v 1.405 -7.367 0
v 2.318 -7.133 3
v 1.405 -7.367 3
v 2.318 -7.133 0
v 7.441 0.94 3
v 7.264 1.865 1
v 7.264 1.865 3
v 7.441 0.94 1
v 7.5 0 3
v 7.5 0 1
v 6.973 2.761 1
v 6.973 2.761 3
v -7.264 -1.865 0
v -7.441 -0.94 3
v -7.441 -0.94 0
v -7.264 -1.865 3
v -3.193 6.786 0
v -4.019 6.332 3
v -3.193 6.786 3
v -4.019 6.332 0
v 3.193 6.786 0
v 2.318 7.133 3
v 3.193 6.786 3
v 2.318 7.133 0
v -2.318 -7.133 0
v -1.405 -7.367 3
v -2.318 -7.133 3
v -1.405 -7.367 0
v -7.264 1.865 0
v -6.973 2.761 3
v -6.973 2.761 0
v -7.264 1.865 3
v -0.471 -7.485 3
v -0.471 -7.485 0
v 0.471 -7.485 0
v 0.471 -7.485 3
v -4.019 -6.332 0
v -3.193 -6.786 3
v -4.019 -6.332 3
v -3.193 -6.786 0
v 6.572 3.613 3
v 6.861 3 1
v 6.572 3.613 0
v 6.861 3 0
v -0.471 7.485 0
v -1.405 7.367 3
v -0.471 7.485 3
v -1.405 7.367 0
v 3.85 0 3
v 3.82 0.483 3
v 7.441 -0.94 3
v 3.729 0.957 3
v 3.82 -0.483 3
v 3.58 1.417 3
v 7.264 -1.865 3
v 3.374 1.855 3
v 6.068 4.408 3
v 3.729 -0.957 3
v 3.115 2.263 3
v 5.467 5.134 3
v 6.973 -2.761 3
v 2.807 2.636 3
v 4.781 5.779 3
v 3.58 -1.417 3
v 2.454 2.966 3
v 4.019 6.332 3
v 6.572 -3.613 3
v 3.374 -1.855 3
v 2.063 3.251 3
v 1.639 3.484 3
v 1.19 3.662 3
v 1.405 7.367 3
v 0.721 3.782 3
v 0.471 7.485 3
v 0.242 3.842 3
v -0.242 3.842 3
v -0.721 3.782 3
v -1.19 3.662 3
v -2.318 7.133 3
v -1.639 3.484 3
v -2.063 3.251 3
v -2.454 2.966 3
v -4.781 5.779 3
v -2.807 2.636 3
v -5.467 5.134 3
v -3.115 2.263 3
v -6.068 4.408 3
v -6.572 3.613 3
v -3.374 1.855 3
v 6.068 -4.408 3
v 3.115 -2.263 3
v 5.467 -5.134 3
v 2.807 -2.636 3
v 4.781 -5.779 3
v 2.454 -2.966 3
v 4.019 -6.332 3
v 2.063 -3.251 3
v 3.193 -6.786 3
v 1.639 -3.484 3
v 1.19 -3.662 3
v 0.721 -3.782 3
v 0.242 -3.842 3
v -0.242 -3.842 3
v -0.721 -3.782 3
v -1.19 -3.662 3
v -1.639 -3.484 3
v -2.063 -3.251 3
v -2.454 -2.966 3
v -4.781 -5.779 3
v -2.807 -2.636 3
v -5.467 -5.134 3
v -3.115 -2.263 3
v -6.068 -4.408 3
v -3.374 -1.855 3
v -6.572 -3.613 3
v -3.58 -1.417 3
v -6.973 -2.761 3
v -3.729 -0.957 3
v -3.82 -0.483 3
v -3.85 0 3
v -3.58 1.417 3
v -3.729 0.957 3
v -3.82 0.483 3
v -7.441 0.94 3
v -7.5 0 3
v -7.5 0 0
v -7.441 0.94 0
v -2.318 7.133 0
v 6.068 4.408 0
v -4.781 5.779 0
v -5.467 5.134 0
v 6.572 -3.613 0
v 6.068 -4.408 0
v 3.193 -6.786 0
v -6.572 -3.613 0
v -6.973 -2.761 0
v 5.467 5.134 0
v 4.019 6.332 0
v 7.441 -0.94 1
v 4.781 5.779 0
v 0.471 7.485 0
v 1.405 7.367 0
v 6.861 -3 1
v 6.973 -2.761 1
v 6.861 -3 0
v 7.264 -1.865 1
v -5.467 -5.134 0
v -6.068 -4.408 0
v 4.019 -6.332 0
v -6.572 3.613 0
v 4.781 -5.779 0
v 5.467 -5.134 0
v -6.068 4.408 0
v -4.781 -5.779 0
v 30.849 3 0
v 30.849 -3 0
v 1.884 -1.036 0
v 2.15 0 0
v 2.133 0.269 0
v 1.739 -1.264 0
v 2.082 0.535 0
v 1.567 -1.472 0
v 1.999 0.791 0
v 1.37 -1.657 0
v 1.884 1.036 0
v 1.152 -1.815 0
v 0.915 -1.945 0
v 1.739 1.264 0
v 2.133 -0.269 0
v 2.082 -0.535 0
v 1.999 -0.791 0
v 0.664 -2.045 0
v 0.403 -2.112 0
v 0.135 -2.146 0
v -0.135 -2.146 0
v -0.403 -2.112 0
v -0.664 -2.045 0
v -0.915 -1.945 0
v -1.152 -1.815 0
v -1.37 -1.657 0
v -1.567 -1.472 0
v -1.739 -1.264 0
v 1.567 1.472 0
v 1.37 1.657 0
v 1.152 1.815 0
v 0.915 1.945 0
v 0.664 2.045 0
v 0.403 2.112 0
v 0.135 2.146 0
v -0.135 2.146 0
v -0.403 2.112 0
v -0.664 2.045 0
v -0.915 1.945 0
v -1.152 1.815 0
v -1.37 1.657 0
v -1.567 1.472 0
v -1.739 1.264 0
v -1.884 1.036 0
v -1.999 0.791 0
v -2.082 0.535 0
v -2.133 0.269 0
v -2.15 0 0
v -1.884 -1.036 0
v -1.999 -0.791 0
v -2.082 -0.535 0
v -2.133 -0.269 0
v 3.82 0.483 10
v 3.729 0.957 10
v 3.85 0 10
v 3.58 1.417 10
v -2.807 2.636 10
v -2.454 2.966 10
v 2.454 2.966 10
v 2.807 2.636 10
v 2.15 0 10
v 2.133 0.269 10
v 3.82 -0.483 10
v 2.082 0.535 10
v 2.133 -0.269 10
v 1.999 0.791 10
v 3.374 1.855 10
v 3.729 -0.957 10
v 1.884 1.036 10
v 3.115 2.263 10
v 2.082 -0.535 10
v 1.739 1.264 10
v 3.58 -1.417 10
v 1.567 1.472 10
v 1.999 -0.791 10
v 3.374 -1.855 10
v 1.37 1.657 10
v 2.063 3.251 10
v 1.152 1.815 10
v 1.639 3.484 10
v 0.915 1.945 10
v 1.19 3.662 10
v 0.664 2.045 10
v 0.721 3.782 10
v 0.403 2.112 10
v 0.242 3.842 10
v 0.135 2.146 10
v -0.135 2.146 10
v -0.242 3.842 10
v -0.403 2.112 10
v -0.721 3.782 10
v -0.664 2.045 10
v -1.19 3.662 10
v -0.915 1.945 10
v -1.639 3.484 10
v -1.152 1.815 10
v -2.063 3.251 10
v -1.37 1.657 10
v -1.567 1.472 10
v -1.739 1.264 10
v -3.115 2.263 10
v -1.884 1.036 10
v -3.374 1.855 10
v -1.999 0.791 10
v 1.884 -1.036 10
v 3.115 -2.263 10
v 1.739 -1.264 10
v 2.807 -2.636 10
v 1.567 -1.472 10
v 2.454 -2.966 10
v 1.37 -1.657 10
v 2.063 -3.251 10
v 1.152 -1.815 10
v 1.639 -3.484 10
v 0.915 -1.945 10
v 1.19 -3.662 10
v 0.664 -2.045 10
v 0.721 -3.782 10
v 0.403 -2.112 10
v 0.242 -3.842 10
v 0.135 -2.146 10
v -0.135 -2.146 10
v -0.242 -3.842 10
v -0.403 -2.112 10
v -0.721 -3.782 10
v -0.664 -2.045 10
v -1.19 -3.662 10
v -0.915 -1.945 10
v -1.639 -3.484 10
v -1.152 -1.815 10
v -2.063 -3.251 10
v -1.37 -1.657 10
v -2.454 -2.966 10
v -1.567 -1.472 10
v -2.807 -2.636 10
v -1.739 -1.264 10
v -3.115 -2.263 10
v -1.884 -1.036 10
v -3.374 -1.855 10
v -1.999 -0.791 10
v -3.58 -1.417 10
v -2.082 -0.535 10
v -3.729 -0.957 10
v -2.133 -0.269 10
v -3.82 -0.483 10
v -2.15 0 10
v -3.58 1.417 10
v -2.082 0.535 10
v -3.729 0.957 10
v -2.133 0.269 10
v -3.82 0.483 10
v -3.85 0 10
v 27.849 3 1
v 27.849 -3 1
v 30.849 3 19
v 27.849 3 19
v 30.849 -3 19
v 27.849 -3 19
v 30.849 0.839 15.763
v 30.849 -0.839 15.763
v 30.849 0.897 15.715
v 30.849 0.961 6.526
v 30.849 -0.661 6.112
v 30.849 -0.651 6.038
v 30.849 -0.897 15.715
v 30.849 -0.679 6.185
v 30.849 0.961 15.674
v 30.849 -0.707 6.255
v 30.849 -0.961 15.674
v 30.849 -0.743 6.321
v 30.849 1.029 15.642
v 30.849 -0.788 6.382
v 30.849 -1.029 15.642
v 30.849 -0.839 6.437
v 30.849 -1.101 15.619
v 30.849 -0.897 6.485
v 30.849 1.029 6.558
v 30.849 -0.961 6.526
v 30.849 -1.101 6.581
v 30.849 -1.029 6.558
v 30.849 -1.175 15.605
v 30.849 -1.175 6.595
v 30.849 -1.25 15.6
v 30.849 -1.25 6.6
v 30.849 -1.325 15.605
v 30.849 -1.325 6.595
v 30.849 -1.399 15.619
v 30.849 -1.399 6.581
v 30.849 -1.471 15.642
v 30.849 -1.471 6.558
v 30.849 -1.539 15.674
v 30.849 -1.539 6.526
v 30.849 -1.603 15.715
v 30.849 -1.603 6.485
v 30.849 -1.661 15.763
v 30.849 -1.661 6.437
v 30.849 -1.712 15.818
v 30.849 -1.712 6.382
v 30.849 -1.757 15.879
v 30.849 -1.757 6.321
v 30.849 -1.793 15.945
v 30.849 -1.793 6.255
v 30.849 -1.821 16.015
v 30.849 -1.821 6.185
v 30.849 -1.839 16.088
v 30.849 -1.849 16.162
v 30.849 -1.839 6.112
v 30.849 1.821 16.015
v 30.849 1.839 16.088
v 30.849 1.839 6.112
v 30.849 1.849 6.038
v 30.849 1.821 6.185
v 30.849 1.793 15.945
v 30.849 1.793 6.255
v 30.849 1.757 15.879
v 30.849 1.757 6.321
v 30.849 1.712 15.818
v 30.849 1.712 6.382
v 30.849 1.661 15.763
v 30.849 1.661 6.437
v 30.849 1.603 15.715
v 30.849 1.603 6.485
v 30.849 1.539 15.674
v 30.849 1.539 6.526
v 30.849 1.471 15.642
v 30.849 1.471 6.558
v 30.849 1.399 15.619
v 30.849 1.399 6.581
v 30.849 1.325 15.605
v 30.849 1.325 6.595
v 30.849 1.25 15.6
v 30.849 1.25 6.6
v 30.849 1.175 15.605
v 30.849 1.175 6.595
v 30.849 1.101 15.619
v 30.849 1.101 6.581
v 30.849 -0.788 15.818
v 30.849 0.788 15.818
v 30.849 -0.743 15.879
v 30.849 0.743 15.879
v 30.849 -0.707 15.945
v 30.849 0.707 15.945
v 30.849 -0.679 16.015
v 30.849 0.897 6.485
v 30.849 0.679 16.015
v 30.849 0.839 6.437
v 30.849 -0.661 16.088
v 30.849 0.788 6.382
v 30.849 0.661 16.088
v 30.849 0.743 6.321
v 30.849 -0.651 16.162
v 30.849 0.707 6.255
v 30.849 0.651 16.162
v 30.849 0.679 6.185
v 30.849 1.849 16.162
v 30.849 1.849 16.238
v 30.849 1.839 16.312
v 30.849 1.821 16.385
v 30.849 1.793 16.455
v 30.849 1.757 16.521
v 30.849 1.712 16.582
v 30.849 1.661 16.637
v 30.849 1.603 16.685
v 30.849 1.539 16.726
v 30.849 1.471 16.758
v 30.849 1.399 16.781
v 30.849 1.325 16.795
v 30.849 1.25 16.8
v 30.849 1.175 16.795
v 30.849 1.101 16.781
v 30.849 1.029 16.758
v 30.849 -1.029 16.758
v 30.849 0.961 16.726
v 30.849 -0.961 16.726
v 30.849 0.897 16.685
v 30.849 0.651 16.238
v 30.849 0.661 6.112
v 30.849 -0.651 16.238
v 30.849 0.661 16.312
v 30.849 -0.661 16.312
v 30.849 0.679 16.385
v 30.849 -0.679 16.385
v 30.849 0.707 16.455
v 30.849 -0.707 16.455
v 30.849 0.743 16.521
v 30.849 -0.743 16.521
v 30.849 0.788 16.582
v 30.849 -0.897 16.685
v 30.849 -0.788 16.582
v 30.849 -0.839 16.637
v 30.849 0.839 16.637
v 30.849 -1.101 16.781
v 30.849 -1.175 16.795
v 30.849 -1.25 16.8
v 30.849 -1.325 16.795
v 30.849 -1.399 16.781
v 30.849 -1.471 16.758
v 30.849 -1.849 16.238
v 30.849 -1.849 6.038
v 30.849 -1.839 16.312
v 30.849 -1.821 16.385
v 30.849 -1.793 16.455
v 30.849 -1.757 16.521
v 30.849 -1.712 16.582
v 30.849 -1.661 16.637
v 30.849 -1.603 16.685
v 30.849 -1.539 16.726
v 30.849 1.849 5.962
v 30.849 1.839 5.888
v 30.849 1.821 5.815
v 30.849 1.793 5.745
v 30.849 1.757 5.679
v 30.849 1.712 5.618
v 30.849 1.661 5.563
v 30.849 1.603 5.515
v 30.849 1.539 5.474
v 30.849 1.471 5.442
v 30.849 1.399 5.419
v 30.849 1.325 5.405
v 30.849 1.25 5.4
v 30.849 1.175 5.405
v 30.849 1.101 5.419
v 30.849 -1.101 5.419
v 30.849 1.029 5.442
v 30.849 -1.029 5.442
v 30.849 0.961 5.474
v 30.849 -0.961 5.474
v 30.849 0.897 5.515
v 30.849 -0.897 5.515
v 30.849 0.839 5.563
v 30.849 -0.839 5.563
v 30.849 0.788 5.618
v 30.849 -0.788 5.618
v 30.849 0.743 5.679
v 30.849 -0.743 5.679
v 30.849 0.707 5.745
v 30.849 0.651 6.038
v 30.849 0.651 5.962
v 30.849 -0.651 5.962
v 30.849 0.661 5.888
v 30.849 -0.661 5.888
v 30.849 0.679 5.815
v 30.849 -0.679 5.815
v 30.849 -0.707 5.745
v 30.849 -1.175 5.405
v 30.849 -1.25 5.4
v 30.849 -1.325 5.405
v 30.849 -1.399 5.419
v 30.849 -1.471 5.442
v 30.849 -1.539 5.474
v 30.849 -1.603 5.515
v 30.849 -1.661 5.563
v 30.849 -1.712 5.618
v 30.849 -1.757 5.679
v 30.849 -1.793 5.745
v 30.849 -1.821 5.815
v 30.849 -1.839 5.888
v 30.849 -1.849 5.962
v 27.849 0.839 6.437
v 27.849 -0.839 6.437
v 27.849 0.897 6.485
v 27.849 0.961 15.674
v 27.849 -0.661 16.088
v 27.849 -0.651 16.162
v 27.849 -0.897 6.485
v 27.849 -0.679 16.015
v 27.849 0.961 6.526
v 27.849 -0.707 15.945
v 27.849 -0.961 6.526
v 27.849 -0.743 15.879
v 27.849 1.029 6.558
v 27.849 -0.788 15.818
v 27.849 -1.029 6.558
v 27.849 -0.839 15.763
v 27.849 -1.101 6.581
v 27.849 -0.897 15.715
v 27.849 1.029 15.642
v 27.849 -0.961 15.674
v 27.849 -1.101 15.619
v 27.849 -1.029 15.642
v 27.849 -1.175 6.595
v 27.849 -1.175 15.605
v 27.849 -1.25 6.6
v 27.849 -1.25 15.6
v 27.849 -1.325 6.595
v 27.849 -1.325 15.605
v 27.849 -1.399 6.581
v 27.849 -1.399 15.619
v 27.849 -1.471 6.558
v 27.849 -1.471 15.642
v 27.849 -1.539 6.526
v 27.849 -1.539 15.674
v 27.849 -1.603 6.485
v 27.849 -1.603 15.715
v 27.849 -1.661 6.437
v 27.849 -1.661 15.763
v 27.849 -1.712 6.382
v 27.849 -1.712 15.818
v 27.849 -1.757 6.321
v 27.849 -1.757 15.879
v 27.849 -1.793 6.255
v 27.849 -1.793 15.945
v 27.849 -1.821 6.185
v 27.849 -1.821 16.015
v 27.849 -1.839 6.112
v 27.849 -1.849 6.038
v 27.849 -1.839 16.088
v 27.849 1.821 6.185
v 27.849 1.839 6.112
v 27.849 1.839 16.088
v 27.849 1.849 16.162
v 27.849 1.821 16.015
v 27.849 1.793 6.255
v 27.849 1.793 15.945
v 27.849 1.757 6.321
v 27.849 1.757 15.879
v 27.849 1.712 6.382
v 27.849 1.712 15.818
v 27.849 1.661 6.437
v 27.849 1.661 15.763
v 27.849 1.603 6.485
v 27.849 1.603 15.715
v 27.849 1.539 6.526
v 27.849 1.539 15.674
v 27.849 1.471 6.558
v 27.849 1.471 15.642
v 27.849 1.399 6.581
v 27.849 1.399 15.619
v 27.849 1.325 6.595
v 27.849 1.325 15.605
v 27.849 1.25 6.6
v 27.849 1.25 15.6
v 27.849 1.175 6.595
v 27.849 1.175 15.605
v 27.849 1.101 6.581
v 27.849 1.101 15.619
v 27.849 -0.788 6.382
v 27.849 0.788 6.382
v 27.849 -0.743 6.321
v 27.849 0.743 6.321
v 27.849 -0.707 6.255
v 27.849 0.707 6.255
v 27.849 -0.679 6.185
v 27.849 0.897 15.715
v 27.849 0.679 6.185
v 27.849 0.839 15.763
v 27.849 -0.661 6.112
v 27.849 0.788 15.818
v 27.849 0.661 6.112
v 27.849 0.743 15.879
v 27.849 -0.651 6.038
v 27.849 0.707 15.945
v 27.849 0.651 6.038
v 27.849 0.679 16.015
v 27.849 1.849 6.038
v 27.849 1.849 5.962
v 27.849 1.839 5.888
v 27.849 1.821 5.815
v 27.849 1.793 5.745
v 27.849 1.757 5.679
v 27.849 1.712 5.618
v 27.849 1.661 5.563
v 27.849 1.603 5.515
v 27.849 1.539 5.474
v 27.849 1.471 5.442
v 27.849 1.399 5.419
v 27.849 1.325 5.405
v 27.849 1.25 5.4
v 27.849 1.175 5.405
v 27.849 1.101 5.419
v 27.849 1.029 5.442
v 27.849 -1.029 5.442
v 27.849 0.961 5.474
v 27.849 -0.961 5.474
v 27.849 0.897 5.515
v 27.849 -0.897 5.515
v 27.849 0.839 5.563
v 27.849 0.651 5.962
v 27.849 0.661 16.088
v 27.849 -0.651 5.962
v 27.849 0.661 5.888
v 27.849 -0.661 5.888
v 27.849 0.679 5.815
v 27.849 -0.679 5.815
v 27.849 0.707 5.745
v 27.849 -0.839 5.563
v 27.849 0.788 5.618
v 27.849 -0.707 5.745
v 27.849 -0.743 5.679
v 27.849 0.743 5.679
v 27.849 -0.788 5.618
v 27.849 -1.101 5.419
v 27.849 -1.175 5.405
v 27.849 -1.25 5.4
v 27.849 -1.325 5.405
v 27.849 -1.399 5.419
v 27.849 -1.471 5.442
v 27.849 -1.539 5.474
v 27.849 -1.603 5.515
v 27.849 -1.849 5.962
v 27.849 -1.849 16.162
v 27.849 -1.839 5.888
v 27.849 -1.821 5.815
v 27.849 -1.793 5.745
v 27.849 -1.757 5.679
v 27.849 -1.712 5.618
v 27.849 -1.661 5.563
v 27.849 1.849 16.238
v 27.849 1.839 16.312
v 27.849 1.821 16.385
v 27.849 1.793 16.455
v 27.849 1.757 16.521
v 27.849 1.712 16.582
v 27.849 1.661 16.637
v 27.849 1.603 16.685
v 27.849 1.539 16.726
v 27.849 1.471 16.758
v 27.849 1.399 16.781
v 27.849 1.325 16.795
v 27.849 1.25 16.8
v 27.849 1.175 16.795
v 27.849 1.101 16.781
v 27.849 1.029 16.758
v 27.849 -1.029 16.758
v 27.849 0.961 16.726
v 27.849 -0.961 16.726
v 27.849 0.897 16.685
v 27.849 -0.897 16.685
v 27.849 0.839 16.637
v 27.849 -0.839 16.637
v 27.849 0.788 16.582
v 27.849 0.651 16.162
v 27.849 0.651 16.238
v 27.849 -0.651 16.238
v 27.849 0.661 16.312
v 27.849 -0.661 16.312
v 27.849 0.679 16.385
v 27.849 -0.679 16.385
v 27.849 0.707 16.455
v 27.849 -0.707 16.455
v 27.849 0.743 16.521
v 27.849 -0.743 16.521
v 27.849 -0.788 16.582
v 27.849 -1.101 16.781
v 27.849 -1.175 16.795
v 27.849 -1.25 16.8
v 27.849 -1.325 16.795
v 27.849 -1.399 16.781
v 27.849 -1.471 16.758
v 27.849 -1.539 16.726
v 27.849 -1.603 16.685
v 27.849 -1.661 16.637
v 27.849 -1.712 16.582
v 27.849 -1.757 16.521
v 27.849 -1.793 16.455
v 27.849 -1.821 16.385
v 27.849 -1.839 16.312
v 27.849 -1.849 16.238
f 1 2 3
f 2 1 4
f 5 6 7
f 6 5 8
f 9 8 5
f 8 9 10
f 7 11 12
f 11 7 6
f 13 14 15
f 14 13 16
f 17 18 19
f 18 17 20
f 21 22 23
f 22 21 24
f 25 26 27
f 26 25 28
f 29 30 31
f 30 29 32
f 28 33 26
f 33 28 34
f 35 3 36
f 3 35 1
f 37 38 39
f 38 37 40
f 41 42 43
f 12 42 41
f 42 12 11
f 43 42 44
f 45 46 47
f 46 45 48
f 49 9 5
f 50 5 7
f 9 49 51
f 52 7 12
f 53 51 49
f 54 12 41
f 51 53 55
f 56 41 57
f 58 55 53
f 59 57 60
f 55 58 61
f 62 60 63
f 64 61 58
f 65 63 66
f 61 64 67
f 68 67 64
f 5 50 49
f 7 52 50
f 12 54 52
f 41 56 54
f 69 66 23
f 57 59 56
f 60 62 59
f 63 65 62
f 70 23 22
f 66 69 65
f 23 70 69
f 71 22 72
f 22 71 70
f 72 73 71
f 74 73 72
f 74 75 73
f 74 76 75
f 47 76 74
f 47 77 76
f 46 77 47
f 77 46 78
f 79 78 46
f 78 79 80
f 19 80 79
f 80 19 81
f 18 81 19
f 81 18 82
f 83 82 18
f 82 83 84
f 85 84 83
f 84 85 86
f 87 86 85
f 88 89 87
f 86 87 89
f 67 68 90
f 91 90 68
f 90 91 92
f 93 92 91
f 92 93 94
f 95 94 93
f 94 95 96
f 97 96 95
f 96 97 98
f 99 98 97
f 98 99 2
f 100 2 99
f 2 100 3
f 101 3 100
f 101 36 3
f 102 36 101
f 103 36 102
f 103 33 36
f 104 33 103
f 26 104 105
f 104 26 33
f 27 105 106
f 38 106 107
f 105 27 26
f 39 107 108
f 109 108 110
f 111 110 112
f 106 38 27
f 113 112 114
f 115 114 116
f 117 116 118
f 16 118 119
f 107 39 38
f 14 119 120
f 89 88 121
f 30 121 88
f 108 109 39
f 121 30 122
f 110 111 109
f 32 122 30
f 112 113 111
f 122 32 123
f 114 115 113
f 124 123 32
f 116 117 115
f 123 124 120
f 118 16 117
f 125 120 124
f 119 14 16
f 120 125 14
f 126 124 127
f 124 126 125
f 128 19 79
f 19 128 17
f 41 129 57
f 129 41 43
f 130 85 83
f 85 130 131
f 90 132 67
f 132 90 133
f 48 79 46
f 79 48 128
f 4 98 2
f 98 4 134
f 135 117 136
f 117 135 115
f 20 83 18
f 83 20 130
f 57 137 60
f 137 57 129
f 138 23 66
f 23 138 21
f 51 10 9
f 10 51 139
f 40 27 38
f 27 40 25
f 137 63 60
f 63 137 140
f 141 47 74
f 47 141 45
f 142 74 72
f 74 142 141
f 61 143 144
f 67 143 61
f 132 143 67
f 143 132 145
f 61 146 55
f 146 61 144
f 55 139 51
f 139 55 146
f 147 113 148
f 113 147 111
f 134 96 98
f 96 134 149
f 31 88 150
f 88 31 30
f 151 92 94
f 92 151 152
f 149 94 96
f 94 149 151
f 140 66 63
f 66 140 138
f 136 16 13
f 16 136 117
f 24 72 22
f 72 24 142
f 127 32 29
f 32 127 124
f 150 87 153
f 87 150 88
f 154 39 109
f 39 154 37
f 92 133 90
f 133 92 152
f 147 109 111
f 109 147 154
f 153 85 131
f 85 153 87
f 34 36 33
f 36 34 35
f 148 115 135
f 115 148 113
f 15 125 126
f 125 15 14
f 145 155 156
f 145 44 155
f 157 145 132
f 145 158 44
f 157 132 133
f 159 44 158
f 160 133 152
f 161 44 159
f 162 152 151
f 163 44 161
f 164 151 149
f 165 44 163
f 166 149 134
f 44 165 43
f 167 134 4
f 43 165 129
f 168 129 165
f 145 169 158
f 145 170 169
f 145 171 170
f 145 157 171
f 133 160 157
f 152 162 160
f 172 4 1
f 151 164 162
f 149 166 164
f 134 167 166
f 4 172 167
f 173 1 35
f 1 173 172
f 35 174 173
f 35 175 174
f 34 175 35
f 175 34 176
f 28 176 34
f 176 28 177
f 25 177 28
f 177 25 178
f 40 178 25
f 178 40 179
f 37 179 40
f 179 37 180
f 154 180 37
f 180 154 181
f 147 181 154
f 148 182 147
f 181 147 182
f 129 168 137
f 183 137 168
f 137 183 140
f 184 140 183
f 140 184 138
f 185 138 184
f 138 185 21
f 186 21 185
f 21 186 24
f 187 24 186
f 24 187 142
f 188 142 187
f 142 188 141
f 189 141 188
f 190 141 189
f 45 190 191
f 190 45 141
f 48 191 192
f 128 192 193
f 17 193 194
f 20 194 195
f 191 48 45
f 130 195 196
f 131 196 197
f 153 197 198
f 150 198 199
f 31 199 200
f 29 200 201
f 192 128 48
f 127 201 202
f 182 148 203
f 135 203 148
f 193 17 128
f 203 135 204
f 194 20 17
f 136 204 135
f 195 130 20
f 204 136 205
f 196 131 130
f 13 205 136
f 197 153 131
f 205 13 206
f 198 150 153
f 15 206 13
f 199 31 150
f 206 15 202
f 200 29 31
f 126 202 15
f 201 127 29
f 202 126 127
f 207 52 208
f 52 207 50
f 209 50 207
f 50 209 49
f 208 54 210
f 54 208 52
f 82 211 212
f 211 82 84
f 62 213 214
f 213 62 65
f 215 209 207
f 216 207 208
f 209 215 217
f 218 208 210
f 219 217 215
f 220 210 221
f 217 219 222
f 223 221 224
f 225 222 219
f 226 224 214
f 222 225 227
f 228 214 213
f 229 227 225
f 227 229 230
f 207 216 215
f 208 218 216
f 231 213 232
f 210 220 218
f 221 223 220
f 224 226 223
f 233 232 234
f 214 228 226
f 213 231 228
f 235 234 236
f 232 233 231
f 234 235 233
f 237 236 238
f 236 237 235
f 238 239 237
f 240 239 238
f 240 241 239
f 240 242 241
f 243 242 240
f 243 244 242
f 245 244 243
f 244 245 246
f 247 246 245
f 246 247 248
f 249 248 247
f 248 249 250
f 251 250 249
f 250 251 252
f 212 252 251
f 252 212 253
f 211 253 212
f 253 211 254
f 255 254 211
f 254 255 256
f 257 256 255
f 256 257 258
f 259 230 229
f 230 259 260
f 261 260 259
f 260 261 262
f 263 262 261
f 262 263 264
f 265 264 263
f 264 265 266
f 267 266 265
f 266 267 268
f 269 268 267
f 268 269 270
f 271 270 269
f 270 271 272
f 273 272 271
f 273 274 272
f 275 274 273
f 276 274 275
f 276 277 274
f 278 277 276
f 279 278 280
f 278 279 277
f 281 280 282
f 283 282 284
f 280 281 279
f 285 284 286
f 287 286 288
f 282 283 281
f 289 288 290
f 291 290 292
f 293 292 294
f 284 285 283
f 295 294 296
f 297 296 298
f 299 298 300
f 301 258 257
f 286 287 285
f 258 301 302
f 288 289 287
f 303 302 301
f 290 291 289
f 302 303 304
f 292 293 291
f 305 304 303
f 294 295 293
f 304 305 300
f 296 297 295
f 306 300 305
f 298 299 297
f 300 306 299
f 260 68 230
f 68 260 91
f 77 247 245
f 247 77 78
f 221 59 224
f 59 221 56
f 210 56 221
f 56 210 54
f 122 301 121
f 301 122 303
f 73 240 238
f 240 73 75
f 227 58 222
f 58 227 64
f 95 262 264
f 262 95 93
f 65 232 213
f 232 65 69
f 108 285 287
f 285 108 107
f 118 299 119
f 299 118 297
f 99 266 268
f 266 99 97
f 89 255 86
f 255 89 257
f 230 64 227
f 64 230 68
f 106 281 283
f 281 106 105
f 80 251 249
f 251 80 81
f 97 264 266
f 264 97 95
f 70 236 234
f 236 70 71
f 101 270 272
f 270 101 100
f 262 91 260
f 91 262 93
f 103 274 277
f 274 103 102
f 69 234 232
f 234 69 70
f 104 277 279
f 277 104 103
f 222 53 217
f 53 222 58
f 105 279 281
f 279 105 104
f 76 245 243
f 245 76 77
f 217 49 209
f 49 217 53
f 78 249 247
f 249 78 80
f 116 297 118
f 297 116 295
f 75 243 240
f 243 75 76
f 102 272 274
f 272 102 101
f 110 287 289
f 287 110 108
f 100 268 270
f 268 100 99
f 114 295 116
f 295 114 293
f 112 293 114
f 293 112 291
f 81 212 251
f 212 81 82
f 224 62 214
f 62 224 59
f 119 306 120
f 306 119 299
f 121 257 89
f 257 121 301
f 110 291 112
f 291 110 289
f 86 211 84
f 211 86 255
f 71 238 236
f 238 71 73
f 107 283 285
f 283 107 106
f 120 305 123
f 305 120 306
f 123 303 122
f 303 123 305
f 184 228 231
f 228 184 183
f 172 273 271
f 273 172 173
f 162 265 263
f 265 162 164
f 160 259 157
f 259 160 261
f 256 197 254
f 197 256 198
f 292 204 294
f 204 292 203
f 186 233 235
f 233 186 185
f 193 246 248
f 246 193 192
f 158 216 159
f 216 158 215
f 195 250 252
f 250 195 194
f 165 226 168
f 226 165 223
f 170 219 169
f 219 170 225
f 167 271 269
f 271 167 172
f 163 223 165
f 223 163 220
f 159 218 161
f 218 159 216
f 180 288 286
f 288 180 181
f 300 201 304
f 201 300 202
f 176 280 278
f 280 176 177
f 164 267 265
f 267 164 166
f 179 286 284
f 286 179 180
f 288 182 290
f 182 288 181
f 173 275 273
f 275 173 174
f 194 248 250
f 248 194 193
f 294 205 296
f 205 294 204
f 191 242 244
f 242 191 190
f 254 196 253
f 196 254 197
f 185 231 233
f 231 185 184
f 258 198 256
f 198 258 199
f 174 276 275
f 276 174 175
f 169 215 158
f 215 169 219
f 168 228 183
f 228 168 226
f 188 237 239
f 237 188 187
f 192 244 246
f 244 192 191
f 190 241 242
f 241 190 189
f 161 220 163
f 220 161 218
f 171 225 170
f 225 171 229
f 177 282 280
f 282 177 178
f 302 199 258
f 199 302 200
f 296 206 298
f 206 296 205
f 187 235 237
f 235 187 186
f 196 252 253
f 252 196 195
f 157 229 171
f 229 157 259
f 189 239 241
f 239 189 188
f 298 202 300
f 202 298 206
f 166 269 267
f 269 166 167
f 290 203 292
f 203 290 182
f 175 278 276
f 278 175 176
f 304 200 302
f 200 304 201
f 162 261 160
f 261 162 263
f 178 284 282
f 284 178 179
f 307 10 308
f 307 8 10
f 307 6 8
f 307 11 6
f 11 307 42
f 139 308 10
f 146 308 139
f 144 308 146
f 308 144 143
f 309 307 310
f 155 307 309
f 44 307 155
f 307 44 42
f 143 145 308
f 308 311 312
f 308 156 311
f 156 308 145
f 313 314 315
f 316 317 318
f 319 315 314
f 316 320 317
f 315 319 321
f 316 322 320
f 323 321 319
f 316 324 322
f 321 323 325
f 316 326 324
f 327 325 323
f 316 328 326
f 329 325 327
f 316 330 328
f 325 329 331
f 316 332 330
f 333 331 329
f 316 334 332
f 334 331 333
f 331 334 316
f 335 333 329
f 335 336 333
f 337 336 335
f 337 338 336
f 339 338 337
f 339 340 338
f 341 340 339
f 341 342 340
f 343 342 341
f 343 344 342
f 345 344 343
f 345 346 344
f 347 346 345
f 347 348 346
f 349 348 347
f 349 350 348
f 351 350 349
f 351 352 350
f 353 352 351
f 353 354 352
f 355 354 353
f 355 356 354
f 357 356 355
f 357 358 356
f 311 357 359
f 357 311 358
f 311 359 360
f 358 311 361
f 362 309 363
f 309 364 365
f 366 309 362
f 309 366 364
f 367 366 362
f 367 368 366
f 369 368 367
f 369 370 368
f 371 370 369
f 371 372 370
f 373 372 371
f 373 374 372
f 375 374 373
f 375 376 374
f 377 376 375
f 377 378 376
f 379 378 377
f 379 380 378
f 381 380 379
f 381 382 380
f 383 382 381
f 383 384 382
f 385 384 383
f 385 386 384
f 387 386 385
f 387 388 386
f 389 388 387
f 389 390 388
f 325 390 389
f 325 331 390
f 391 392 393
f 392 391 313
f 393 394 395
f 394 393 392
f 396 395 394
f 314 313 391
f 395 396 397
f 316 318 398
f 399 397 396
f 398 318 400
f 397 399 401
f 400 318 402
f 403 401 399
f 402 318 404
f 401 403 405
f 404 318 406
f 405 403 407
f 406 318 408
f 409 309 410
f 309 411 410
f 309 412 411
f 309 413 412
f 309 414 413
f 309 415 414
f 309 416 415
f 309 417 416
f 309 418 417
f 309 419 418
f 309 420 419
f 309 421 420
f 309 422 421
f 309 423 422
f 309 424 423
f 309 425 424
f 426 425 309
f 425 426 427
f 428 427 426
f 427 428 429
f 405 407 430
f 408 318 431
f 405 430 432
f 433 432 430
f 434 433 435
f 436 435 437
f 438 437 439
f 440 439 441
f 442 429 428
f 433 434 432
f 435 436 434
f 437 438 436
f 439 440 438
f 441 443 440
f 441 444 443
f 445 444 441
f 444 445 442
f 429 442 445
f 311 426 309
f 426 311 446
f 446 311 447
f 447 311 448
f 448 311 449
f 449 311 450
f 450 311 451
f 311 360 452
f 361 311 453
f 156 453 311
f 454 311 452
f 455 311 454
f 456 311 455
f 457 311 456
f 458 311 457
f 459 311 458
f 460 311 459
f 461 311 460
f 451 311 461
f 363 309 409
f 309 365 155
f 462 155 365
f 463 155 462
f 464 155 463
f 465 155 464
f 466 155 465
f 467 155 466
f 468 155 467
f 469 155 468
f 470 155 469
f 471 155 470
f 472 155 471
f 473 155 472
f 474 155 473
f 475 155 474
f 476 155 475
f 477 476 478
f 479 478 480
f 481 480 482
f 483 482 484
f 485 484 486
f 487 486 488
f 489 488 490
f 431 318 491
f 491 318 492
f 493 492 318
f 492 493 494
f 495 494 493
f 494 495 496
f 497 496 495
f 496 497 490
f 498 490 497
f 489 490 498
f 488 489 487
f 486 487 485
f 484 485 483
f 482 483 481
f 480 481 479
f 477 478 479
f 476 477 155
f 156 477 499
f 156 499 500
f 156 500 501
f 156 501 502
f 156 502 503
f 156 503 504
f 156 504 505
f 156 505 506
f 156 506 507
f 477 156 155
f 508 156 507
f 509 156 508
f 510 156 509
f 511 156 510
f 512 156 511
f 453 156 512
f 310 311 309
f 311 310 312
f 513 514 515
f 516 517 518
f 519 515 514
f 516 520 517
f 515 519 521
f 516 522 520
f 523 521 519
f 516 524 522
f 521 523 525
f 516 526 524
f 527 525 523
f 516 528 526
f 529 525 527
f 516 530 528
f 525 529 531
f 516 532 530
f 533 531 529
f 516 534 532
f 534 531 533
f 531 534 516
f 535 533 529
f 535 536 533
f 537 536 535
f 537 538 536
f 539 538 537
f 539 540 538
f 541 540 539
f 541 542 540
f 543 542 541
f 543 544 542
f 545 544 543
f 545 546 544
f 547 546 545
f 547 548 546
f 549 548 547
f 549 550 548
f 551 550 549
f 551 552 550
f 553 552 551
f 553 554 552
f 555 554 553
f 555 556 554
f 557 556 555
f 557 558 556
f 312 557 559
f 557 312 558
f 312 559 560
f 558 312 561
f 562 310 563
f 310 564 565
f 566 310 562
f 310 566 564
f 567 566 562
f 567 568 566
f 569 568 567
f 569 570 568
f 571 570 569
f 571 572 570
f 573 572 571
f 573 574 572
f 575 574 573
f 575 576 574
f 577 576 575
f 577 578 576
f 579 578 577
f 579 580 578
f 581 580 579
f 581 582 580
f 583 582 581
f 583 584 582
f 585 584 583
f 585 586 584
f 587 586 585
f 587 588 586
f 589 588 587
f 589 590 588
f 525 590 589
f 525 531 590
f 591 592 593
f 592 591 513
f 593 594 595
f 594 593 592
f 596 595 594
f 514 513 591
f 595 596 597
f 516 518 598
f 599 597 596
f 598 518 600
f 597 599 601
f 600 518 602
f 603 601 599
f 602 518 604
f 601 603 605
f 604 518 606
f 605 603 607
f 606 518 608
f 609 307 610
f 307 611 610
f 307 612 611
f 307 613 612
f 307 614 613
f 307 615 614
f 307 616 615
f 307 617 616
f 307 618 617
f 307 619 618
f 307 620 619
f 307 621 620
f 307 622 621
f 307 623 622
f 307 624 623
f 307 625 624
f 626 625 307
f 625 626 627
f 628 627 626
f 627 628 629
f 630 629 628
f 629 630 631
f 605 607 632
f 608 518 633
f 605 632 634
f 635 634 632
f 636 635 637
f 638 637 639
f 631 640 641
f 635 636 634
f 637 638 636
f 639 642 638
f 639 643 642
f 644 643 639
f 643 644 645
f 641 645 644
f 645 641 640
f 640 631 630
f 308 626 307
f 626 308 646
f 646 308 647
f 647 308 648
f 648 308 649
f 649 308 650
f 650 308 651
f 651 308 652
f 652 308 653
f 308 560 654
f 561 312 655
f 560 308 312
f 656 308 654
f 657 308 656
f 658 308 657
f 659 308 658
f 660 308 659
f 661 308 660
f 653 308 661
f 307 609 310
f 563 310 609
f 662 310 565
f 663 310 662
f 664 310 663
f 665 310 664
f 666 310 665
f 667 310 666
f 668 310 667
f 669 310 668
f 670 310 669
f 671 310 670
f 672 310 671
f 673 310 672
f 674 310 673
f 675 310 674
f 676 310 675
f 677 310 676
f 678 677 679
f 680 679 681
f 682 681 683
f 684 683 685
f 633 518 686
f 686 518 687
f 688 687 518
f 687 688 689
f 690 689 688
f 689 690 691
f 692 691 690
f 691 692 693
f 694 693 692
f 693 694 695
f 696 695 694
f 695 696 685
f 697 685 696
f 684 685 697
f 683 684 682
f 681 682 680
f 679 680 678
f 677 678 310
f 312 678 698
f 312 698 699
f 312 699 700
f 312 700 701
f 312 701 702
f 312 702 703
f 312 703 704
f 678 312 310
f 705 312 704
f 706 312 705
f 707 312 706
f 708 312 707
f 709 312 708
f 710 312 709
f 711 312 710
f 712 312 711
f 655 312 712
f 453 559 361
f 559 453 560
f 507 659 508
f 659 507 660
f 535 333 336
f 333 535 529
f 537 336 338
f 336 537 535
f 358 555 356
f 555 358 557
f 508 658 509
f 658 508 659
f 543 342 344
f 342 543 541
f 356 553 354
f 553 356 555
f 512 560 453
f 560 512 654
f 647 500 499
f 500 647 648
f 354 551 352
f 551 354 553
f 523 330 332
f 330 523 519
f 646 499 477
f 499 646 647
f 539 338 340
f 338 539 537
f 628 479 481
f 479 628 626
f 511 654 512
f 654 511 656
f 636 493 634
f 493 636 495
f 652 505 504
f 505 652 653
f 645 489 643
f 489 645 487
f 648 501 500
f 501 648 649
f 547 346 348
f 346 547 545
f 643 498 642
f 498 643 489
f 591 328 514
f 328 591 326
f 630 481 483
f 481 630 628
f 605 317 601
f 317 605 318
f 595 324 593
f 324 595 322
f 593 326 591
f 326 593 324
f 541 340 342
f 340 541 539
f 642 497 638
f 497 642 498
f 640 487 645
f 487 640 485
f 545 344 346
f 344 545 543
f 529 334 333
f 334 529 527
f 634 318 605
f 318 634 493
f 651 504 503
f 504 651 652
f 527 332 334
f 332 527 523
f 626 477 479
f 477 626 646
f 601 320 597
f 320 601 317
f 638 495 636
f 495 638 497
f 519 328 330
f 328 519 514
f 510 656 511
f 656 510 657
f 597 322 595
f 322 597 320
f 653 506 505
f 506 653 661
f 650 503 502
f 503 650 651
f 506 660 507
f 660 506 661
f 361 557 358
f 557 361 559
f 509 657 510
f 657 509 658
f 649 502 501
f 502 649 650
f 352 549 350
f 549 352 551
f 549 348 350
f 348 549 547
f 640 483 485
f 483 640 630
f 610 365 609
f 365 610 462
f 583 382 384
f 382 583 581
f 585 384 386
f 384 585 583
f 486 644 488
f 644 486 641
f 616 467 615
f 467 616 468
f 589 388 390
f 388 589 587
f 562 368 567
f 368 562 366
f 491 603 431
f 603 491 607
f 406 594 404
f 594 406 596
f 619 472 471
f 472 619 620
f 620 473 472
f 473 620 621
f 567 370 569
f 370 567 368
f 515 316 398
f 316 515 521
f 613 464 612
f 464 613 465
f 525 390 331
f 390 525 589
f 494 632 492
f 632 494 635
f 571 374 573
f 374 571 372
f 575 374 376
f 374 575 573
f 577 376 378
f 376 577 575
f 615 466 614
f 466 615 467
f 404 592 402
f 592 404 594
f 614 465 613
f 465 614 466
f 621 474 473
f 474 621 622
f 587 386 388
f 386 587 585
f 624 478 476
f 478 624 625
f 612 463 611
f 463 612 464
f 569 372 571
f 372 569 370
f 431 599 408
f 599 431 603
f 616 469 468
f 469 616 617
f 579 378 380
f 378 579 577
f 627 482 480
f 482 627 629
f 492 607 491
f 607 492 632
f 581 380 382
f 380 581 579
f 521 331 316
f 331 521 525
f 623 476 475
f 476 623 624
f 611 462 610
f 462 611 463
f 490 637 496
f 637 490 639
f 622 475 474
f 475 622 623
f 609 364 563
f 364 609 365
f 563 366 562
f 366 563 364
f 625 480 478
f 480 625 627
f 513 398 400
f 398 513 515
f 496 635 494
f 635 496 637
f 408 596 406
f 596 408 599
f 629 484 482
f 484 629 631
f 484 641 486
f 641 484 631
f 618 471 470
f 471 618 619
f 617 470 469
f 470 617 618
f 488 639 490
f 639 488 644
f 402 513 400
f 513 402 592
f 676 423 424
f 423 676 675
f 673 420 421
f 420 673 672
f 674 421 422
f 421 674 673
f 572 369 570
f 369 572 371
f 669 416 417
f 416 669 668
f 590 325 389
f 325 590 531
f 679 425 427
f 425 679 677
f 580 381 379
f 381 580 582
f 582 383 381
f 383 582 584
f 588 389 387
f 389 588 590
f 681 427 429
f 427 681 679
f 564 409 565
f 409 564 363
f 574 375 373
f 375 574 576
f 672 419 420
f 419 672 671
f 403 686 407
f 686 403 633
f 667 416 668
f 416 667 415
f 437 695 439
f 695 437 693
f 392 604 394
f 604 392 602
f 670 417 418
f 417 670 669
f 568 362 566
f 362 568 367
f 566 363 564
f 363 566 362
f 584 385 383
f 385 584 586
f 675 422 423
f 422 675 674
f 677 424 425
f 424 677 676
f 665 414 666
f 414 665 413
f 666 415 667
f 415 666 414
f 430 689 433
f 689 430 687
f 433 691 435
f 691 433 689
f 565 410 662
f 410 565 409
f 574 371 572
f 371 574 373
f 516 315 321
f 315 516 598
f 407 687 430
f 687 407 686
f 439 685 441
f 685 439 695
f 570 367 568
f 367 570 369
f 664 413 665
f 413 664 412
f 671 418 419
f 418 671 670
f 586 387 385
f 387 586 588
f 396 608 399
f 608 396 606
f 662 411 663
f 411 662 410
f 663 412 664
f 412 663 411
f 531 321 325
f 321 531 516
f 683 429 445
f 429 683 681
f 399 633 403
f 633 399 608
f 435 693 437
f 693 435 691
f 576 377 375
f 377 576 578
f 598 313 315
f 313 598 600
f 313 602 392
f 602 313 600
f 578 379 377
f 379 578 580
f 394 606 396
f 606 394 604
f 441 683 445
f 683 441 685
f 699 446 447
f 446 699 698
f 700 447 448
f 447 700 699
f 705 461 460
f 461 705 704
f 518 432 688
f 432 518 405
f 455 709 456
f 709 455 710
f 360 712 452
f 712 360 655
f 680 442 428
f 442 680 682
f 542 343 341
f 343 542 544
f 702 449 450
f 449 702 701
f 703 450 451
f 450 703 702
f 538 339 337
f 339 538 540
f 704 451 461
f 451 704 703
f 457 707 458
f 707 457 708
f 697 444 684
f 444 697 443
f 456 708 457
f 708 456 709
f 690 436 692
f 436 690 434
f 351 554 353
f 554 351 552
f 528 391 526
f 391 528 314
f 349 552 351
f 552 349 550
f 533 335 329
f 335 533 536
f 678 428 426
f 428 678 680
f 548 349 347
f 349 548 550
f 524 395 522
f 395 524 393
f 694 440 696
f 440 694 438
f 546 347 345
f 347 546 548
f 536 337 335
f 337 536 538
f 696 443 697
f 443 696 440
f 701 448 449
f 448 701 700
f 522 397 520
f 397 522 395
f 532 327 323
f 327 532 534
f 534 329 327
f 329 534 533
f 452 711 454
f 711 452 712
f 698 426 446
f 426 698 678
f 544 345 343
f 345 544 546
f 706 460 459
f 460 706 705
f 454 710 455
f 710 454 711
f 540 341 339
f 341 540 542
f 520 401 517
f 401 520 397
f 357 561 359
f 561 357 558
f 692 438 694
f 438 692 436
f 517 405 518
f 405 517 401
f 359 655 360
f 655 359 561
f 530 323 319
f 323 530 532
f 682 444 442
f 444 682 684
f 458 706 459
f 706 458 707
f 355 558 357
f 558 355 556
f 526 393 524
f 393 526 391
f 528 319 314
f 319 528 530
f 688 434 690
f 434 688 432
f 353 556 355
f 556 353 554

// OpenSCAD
$fn=50;
$fa=0.1;
// inner stuff
washer_h = 3; //mm
bearing_h = 7;
screw_d = 4.3;

// outer stuff
full_rotation_length = 12; //cm
flange_size = 10; //mm
flange_h = 1;
encoder_h = 7;
minimum_measured_distance = 2; //cm
rubber_thickness = 0.75;

/* inner */
module shaft() {
	union() {
		cylinder(h=washer_h, d=15);
		cylinder(h=bearing_h+washer_h, d=7.7);	
	}
}

module shaftWasher() {
	difference() {
		shaft();
		translate([0,0,-1])cylinder(h=13, d=screw_d);
	}
}

module cap() {
	difference() {
		cylinder(h=washer_h, d=15);
		cylinder(h=3, d=screw_d);
	}
}

/* outer */

echo("*********************** encoder_d ******************");
encoder_d = 10*full_rotation_length/PI-rubber_thickness*2;
echo(encoder_d);
module encoderMainShaft() {
	union() {
		translate([0,0,flange_h])cylinder(h=encoder_h, d=encoder_d);
		bottom_flange();
		top_flange();
	}
}

module bottom_flange() {
	cylinder(h=flange_h, d=encoder_d+flange_size);
}

module top_flange() {
	translate([0,0,flange_h+encoder_h])difference() {
		// flange itself
		cylinder(h=flange_h, d=encoder_d+flange_size+5);
		// top hole
		cylinder(h=flange_h, d=18);
		distance_between_cutouts = 360/(full_rotation_length/minimum_measured_distance);
		// encoder cutouts
		for (cutout_angle = [0:distance_between_cutouts:360]) {
			rotate([0,0,cutout_angle])
				translate([0,encoder_d/2+flange_size/2,1])
					cube([flange_size/2,flange_size,flange_h*3],true);
		}
	}
}

module encoder() {
	difference() {
		encoderMainShaft();
		cylinder(h=flange_h+encoder_h, d=22);
	}
}

/* opto holder */
module optocouple() {
	cube([13,6.5,1]);
	cube([4,6.5,7.5]);
	translate([9,0,0])cube([4,6.5,7.5]);
}

module opto_holder() {
	arm_width = 6;
	arm_length = encoder_d/2+flange_size/2+0.5;
	opto_lenght = 13;
	union() {
		shaftWasher();
		// arm
		translate([arm_width,-arm_width/2,0])cube([arm_length,arm_width,1]);
		// holder
		translate([arm_length+arm_width-2,-arm_width/2,0])cube([3,arm_width, opto_lenght+flange_h+5]);
	}
}

module opto_legs() {
	legs_d = 1.2;
	cylinder(h=5, d=legs_d);
	translate([0,2.5,0])cylinder(h=5, d=legs_d);
	translate([10.2,2.5,0])cylinder(h=5, d=legs_d);
	translate([10.2,0,0])cylinder(h=5, d=legs_d);
}

/*
// draw encoder
color("RoyalBlue")translate([0,0,washer_h-1])
	encoder();
	*/

// draw optocouple holder
color("LightSlateGray")difference() {
	opto_holder();
	translate([encoder_d/2+1+flange_size/2+7,-1.25,6])rotate([0,-90,0])
		opto_legs();
}

/*
// draw optocouple
translate([encoder_d/2+9,-3.25,4.5])rotate([0,-90,0])color("Black")
	optocouple();
	*/
